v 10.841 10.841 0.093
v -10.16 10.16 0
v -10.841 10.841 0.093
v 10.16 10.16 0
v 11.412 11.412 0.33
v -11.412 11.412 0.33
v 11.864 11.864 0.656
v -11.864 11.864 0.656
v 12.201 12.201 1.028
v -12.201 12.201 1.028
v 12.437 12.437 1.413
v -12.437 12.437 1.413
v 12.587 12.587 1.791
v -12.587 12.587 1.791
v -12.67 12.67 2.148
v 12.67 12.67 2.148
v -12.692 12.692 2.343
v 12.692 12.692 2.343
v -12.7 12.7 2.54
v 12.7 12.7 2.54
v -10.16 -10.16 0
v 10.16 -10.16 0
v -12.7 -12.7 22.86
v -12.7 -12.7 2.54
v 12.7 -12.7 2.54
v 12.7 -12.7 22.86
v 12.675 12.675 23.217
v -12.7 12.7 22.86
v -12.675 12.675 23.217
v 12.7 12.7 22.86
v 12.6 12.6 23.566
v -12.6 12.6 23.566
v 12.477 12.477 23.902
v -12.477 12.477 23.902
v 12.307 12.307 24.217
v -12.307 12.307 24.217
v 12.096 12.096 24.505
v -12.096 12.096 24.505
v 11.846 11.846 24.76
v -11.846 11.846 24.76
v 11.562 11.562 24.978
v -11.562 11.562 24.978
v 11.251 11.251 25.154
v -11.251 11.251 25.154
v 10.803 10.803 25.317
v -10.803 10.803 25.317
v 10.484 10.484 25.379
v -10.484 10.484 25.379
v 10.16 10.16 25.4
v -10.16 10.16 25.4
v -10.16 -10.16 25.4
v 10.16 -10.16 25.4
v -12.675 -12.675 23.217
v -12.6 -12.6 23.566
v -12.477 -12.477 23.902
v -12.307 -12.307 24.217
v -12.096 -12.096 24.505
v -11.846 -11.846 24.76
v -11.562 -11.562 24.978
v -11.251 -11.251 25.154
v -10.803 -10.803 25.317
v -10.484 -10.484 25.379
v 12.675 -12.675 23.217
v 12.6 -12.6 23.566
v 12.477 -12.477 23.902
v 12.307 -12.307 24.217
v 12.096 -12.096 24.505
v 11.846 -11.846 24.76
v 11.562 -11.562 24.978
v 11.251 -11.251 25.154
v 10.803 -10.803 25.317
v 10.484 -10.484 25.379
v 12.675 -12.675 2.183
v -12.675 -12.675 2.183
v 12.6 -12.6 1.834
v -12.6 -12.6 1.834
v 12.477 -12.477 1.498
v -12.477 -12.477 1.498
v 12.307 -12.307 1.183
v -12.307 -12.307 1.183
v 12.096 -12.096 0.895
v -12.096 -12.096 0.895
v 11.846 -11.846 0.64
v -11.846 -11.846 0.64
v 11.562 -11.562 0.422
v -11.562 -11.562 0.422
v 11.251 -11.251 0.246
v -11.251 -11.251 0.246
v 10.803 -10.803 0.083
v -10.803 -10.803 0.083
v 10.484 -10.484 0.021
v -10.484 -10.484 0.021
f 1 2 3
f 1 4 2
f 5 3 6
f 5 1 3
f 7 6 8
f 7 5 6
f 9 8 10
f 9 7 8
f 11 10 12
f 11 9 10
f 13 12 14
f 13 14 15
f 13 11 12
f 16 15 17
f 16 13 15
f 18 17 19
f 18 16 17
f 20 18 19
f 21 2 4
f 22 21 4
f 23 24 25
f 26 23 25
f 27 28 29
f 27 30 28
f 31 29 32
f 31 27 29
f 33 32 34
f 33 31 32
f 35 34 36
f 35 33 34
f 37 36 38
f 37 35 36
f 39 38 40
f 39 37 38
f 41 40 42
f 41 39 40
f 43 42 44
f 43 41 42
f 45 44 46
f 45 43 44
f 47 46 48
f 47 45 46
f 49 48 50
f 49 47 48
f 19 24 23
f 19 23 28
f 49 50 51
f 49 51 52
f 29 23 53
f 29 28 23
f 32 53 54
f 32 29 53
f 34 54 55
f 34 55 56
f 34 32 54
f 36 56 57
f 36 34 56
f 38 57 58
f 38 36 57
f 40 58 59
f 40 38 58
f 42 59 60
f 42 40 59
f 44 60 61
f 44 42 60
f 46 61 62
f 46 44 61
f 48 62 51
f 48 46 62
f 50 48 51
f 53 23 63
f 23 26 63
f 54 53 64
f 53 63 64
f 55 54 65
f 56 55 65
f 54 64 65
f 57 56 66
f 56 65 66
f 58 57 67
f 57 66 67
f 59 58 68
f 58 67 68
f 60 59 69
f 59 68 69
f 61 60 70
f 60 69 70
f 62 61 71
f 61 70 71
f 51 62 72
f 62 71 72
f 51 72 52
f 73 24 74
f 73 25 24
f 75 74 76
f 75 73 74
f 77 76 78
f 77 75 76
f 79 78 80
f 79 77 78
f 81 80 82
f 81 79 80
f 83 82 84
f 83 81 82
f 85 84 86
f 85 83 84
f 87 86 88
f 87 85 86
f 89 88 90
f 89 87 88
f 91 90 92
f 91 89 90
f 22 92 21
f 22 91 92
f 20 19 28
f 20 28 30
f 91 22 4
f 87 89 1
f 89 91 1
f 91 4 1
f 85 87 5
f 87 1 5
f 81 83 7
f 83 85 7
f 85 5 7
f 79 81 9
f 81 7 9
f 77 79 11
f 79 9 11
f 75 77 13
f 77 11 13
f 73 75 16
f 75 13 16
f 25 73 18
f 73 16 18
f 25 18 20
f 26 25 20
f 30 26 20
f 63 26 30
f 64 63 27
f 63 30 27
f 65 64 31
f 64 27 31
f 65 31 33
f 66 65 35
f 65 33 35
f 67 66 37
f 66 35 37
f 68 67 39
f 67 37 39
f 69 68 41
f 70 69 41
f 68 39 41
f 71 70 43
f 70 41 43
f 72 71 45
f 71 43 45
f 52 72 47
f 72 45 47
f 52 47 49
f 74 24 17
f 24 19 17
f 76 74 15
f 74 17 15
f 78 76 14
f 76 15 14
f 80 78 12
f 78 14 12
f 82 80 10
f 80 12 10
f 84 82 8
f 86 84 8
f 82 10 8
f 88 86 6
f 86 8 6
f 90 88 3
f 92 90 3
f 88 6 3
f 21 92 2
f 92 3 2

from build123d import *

# Parameters (mm, degrees)
F0_W     = 25.4
F0_H     = 25.4
F1_DEPTH = 25.4
F3_R     = 2.54
F4_R     = 2.54


with BuildPart() as f1:
    # F0 (on Top) → F1 (new body)
    with BuildSketch(Plane.XY):
        Rectangle(F0_W, F0_H)
    extrude(amount=F1_DEPTH)

    # F3
    f3_edges = [f1.edges().sort_by_distance(p)[0] for p in [
        (0, 12.7, 25.4),
        (-12.7, 0, 25.4),
        (0, -12.7, 25.4),
        (12.7, 0, 25.4),
    ]]
    fillet(f3_edges, radius=F3_R)

    # F4
    f4_edges = [f1.edges().sort_by_distance(p)[0] for p in [
        (0, 12.7, 0),
        (-12.7, 0, 0),
        (0, -12.7, 0),
        (12.7, 0, 0),
    ]]
    fillet(f4_edges, radius=F4_R)


solid = f1.part
